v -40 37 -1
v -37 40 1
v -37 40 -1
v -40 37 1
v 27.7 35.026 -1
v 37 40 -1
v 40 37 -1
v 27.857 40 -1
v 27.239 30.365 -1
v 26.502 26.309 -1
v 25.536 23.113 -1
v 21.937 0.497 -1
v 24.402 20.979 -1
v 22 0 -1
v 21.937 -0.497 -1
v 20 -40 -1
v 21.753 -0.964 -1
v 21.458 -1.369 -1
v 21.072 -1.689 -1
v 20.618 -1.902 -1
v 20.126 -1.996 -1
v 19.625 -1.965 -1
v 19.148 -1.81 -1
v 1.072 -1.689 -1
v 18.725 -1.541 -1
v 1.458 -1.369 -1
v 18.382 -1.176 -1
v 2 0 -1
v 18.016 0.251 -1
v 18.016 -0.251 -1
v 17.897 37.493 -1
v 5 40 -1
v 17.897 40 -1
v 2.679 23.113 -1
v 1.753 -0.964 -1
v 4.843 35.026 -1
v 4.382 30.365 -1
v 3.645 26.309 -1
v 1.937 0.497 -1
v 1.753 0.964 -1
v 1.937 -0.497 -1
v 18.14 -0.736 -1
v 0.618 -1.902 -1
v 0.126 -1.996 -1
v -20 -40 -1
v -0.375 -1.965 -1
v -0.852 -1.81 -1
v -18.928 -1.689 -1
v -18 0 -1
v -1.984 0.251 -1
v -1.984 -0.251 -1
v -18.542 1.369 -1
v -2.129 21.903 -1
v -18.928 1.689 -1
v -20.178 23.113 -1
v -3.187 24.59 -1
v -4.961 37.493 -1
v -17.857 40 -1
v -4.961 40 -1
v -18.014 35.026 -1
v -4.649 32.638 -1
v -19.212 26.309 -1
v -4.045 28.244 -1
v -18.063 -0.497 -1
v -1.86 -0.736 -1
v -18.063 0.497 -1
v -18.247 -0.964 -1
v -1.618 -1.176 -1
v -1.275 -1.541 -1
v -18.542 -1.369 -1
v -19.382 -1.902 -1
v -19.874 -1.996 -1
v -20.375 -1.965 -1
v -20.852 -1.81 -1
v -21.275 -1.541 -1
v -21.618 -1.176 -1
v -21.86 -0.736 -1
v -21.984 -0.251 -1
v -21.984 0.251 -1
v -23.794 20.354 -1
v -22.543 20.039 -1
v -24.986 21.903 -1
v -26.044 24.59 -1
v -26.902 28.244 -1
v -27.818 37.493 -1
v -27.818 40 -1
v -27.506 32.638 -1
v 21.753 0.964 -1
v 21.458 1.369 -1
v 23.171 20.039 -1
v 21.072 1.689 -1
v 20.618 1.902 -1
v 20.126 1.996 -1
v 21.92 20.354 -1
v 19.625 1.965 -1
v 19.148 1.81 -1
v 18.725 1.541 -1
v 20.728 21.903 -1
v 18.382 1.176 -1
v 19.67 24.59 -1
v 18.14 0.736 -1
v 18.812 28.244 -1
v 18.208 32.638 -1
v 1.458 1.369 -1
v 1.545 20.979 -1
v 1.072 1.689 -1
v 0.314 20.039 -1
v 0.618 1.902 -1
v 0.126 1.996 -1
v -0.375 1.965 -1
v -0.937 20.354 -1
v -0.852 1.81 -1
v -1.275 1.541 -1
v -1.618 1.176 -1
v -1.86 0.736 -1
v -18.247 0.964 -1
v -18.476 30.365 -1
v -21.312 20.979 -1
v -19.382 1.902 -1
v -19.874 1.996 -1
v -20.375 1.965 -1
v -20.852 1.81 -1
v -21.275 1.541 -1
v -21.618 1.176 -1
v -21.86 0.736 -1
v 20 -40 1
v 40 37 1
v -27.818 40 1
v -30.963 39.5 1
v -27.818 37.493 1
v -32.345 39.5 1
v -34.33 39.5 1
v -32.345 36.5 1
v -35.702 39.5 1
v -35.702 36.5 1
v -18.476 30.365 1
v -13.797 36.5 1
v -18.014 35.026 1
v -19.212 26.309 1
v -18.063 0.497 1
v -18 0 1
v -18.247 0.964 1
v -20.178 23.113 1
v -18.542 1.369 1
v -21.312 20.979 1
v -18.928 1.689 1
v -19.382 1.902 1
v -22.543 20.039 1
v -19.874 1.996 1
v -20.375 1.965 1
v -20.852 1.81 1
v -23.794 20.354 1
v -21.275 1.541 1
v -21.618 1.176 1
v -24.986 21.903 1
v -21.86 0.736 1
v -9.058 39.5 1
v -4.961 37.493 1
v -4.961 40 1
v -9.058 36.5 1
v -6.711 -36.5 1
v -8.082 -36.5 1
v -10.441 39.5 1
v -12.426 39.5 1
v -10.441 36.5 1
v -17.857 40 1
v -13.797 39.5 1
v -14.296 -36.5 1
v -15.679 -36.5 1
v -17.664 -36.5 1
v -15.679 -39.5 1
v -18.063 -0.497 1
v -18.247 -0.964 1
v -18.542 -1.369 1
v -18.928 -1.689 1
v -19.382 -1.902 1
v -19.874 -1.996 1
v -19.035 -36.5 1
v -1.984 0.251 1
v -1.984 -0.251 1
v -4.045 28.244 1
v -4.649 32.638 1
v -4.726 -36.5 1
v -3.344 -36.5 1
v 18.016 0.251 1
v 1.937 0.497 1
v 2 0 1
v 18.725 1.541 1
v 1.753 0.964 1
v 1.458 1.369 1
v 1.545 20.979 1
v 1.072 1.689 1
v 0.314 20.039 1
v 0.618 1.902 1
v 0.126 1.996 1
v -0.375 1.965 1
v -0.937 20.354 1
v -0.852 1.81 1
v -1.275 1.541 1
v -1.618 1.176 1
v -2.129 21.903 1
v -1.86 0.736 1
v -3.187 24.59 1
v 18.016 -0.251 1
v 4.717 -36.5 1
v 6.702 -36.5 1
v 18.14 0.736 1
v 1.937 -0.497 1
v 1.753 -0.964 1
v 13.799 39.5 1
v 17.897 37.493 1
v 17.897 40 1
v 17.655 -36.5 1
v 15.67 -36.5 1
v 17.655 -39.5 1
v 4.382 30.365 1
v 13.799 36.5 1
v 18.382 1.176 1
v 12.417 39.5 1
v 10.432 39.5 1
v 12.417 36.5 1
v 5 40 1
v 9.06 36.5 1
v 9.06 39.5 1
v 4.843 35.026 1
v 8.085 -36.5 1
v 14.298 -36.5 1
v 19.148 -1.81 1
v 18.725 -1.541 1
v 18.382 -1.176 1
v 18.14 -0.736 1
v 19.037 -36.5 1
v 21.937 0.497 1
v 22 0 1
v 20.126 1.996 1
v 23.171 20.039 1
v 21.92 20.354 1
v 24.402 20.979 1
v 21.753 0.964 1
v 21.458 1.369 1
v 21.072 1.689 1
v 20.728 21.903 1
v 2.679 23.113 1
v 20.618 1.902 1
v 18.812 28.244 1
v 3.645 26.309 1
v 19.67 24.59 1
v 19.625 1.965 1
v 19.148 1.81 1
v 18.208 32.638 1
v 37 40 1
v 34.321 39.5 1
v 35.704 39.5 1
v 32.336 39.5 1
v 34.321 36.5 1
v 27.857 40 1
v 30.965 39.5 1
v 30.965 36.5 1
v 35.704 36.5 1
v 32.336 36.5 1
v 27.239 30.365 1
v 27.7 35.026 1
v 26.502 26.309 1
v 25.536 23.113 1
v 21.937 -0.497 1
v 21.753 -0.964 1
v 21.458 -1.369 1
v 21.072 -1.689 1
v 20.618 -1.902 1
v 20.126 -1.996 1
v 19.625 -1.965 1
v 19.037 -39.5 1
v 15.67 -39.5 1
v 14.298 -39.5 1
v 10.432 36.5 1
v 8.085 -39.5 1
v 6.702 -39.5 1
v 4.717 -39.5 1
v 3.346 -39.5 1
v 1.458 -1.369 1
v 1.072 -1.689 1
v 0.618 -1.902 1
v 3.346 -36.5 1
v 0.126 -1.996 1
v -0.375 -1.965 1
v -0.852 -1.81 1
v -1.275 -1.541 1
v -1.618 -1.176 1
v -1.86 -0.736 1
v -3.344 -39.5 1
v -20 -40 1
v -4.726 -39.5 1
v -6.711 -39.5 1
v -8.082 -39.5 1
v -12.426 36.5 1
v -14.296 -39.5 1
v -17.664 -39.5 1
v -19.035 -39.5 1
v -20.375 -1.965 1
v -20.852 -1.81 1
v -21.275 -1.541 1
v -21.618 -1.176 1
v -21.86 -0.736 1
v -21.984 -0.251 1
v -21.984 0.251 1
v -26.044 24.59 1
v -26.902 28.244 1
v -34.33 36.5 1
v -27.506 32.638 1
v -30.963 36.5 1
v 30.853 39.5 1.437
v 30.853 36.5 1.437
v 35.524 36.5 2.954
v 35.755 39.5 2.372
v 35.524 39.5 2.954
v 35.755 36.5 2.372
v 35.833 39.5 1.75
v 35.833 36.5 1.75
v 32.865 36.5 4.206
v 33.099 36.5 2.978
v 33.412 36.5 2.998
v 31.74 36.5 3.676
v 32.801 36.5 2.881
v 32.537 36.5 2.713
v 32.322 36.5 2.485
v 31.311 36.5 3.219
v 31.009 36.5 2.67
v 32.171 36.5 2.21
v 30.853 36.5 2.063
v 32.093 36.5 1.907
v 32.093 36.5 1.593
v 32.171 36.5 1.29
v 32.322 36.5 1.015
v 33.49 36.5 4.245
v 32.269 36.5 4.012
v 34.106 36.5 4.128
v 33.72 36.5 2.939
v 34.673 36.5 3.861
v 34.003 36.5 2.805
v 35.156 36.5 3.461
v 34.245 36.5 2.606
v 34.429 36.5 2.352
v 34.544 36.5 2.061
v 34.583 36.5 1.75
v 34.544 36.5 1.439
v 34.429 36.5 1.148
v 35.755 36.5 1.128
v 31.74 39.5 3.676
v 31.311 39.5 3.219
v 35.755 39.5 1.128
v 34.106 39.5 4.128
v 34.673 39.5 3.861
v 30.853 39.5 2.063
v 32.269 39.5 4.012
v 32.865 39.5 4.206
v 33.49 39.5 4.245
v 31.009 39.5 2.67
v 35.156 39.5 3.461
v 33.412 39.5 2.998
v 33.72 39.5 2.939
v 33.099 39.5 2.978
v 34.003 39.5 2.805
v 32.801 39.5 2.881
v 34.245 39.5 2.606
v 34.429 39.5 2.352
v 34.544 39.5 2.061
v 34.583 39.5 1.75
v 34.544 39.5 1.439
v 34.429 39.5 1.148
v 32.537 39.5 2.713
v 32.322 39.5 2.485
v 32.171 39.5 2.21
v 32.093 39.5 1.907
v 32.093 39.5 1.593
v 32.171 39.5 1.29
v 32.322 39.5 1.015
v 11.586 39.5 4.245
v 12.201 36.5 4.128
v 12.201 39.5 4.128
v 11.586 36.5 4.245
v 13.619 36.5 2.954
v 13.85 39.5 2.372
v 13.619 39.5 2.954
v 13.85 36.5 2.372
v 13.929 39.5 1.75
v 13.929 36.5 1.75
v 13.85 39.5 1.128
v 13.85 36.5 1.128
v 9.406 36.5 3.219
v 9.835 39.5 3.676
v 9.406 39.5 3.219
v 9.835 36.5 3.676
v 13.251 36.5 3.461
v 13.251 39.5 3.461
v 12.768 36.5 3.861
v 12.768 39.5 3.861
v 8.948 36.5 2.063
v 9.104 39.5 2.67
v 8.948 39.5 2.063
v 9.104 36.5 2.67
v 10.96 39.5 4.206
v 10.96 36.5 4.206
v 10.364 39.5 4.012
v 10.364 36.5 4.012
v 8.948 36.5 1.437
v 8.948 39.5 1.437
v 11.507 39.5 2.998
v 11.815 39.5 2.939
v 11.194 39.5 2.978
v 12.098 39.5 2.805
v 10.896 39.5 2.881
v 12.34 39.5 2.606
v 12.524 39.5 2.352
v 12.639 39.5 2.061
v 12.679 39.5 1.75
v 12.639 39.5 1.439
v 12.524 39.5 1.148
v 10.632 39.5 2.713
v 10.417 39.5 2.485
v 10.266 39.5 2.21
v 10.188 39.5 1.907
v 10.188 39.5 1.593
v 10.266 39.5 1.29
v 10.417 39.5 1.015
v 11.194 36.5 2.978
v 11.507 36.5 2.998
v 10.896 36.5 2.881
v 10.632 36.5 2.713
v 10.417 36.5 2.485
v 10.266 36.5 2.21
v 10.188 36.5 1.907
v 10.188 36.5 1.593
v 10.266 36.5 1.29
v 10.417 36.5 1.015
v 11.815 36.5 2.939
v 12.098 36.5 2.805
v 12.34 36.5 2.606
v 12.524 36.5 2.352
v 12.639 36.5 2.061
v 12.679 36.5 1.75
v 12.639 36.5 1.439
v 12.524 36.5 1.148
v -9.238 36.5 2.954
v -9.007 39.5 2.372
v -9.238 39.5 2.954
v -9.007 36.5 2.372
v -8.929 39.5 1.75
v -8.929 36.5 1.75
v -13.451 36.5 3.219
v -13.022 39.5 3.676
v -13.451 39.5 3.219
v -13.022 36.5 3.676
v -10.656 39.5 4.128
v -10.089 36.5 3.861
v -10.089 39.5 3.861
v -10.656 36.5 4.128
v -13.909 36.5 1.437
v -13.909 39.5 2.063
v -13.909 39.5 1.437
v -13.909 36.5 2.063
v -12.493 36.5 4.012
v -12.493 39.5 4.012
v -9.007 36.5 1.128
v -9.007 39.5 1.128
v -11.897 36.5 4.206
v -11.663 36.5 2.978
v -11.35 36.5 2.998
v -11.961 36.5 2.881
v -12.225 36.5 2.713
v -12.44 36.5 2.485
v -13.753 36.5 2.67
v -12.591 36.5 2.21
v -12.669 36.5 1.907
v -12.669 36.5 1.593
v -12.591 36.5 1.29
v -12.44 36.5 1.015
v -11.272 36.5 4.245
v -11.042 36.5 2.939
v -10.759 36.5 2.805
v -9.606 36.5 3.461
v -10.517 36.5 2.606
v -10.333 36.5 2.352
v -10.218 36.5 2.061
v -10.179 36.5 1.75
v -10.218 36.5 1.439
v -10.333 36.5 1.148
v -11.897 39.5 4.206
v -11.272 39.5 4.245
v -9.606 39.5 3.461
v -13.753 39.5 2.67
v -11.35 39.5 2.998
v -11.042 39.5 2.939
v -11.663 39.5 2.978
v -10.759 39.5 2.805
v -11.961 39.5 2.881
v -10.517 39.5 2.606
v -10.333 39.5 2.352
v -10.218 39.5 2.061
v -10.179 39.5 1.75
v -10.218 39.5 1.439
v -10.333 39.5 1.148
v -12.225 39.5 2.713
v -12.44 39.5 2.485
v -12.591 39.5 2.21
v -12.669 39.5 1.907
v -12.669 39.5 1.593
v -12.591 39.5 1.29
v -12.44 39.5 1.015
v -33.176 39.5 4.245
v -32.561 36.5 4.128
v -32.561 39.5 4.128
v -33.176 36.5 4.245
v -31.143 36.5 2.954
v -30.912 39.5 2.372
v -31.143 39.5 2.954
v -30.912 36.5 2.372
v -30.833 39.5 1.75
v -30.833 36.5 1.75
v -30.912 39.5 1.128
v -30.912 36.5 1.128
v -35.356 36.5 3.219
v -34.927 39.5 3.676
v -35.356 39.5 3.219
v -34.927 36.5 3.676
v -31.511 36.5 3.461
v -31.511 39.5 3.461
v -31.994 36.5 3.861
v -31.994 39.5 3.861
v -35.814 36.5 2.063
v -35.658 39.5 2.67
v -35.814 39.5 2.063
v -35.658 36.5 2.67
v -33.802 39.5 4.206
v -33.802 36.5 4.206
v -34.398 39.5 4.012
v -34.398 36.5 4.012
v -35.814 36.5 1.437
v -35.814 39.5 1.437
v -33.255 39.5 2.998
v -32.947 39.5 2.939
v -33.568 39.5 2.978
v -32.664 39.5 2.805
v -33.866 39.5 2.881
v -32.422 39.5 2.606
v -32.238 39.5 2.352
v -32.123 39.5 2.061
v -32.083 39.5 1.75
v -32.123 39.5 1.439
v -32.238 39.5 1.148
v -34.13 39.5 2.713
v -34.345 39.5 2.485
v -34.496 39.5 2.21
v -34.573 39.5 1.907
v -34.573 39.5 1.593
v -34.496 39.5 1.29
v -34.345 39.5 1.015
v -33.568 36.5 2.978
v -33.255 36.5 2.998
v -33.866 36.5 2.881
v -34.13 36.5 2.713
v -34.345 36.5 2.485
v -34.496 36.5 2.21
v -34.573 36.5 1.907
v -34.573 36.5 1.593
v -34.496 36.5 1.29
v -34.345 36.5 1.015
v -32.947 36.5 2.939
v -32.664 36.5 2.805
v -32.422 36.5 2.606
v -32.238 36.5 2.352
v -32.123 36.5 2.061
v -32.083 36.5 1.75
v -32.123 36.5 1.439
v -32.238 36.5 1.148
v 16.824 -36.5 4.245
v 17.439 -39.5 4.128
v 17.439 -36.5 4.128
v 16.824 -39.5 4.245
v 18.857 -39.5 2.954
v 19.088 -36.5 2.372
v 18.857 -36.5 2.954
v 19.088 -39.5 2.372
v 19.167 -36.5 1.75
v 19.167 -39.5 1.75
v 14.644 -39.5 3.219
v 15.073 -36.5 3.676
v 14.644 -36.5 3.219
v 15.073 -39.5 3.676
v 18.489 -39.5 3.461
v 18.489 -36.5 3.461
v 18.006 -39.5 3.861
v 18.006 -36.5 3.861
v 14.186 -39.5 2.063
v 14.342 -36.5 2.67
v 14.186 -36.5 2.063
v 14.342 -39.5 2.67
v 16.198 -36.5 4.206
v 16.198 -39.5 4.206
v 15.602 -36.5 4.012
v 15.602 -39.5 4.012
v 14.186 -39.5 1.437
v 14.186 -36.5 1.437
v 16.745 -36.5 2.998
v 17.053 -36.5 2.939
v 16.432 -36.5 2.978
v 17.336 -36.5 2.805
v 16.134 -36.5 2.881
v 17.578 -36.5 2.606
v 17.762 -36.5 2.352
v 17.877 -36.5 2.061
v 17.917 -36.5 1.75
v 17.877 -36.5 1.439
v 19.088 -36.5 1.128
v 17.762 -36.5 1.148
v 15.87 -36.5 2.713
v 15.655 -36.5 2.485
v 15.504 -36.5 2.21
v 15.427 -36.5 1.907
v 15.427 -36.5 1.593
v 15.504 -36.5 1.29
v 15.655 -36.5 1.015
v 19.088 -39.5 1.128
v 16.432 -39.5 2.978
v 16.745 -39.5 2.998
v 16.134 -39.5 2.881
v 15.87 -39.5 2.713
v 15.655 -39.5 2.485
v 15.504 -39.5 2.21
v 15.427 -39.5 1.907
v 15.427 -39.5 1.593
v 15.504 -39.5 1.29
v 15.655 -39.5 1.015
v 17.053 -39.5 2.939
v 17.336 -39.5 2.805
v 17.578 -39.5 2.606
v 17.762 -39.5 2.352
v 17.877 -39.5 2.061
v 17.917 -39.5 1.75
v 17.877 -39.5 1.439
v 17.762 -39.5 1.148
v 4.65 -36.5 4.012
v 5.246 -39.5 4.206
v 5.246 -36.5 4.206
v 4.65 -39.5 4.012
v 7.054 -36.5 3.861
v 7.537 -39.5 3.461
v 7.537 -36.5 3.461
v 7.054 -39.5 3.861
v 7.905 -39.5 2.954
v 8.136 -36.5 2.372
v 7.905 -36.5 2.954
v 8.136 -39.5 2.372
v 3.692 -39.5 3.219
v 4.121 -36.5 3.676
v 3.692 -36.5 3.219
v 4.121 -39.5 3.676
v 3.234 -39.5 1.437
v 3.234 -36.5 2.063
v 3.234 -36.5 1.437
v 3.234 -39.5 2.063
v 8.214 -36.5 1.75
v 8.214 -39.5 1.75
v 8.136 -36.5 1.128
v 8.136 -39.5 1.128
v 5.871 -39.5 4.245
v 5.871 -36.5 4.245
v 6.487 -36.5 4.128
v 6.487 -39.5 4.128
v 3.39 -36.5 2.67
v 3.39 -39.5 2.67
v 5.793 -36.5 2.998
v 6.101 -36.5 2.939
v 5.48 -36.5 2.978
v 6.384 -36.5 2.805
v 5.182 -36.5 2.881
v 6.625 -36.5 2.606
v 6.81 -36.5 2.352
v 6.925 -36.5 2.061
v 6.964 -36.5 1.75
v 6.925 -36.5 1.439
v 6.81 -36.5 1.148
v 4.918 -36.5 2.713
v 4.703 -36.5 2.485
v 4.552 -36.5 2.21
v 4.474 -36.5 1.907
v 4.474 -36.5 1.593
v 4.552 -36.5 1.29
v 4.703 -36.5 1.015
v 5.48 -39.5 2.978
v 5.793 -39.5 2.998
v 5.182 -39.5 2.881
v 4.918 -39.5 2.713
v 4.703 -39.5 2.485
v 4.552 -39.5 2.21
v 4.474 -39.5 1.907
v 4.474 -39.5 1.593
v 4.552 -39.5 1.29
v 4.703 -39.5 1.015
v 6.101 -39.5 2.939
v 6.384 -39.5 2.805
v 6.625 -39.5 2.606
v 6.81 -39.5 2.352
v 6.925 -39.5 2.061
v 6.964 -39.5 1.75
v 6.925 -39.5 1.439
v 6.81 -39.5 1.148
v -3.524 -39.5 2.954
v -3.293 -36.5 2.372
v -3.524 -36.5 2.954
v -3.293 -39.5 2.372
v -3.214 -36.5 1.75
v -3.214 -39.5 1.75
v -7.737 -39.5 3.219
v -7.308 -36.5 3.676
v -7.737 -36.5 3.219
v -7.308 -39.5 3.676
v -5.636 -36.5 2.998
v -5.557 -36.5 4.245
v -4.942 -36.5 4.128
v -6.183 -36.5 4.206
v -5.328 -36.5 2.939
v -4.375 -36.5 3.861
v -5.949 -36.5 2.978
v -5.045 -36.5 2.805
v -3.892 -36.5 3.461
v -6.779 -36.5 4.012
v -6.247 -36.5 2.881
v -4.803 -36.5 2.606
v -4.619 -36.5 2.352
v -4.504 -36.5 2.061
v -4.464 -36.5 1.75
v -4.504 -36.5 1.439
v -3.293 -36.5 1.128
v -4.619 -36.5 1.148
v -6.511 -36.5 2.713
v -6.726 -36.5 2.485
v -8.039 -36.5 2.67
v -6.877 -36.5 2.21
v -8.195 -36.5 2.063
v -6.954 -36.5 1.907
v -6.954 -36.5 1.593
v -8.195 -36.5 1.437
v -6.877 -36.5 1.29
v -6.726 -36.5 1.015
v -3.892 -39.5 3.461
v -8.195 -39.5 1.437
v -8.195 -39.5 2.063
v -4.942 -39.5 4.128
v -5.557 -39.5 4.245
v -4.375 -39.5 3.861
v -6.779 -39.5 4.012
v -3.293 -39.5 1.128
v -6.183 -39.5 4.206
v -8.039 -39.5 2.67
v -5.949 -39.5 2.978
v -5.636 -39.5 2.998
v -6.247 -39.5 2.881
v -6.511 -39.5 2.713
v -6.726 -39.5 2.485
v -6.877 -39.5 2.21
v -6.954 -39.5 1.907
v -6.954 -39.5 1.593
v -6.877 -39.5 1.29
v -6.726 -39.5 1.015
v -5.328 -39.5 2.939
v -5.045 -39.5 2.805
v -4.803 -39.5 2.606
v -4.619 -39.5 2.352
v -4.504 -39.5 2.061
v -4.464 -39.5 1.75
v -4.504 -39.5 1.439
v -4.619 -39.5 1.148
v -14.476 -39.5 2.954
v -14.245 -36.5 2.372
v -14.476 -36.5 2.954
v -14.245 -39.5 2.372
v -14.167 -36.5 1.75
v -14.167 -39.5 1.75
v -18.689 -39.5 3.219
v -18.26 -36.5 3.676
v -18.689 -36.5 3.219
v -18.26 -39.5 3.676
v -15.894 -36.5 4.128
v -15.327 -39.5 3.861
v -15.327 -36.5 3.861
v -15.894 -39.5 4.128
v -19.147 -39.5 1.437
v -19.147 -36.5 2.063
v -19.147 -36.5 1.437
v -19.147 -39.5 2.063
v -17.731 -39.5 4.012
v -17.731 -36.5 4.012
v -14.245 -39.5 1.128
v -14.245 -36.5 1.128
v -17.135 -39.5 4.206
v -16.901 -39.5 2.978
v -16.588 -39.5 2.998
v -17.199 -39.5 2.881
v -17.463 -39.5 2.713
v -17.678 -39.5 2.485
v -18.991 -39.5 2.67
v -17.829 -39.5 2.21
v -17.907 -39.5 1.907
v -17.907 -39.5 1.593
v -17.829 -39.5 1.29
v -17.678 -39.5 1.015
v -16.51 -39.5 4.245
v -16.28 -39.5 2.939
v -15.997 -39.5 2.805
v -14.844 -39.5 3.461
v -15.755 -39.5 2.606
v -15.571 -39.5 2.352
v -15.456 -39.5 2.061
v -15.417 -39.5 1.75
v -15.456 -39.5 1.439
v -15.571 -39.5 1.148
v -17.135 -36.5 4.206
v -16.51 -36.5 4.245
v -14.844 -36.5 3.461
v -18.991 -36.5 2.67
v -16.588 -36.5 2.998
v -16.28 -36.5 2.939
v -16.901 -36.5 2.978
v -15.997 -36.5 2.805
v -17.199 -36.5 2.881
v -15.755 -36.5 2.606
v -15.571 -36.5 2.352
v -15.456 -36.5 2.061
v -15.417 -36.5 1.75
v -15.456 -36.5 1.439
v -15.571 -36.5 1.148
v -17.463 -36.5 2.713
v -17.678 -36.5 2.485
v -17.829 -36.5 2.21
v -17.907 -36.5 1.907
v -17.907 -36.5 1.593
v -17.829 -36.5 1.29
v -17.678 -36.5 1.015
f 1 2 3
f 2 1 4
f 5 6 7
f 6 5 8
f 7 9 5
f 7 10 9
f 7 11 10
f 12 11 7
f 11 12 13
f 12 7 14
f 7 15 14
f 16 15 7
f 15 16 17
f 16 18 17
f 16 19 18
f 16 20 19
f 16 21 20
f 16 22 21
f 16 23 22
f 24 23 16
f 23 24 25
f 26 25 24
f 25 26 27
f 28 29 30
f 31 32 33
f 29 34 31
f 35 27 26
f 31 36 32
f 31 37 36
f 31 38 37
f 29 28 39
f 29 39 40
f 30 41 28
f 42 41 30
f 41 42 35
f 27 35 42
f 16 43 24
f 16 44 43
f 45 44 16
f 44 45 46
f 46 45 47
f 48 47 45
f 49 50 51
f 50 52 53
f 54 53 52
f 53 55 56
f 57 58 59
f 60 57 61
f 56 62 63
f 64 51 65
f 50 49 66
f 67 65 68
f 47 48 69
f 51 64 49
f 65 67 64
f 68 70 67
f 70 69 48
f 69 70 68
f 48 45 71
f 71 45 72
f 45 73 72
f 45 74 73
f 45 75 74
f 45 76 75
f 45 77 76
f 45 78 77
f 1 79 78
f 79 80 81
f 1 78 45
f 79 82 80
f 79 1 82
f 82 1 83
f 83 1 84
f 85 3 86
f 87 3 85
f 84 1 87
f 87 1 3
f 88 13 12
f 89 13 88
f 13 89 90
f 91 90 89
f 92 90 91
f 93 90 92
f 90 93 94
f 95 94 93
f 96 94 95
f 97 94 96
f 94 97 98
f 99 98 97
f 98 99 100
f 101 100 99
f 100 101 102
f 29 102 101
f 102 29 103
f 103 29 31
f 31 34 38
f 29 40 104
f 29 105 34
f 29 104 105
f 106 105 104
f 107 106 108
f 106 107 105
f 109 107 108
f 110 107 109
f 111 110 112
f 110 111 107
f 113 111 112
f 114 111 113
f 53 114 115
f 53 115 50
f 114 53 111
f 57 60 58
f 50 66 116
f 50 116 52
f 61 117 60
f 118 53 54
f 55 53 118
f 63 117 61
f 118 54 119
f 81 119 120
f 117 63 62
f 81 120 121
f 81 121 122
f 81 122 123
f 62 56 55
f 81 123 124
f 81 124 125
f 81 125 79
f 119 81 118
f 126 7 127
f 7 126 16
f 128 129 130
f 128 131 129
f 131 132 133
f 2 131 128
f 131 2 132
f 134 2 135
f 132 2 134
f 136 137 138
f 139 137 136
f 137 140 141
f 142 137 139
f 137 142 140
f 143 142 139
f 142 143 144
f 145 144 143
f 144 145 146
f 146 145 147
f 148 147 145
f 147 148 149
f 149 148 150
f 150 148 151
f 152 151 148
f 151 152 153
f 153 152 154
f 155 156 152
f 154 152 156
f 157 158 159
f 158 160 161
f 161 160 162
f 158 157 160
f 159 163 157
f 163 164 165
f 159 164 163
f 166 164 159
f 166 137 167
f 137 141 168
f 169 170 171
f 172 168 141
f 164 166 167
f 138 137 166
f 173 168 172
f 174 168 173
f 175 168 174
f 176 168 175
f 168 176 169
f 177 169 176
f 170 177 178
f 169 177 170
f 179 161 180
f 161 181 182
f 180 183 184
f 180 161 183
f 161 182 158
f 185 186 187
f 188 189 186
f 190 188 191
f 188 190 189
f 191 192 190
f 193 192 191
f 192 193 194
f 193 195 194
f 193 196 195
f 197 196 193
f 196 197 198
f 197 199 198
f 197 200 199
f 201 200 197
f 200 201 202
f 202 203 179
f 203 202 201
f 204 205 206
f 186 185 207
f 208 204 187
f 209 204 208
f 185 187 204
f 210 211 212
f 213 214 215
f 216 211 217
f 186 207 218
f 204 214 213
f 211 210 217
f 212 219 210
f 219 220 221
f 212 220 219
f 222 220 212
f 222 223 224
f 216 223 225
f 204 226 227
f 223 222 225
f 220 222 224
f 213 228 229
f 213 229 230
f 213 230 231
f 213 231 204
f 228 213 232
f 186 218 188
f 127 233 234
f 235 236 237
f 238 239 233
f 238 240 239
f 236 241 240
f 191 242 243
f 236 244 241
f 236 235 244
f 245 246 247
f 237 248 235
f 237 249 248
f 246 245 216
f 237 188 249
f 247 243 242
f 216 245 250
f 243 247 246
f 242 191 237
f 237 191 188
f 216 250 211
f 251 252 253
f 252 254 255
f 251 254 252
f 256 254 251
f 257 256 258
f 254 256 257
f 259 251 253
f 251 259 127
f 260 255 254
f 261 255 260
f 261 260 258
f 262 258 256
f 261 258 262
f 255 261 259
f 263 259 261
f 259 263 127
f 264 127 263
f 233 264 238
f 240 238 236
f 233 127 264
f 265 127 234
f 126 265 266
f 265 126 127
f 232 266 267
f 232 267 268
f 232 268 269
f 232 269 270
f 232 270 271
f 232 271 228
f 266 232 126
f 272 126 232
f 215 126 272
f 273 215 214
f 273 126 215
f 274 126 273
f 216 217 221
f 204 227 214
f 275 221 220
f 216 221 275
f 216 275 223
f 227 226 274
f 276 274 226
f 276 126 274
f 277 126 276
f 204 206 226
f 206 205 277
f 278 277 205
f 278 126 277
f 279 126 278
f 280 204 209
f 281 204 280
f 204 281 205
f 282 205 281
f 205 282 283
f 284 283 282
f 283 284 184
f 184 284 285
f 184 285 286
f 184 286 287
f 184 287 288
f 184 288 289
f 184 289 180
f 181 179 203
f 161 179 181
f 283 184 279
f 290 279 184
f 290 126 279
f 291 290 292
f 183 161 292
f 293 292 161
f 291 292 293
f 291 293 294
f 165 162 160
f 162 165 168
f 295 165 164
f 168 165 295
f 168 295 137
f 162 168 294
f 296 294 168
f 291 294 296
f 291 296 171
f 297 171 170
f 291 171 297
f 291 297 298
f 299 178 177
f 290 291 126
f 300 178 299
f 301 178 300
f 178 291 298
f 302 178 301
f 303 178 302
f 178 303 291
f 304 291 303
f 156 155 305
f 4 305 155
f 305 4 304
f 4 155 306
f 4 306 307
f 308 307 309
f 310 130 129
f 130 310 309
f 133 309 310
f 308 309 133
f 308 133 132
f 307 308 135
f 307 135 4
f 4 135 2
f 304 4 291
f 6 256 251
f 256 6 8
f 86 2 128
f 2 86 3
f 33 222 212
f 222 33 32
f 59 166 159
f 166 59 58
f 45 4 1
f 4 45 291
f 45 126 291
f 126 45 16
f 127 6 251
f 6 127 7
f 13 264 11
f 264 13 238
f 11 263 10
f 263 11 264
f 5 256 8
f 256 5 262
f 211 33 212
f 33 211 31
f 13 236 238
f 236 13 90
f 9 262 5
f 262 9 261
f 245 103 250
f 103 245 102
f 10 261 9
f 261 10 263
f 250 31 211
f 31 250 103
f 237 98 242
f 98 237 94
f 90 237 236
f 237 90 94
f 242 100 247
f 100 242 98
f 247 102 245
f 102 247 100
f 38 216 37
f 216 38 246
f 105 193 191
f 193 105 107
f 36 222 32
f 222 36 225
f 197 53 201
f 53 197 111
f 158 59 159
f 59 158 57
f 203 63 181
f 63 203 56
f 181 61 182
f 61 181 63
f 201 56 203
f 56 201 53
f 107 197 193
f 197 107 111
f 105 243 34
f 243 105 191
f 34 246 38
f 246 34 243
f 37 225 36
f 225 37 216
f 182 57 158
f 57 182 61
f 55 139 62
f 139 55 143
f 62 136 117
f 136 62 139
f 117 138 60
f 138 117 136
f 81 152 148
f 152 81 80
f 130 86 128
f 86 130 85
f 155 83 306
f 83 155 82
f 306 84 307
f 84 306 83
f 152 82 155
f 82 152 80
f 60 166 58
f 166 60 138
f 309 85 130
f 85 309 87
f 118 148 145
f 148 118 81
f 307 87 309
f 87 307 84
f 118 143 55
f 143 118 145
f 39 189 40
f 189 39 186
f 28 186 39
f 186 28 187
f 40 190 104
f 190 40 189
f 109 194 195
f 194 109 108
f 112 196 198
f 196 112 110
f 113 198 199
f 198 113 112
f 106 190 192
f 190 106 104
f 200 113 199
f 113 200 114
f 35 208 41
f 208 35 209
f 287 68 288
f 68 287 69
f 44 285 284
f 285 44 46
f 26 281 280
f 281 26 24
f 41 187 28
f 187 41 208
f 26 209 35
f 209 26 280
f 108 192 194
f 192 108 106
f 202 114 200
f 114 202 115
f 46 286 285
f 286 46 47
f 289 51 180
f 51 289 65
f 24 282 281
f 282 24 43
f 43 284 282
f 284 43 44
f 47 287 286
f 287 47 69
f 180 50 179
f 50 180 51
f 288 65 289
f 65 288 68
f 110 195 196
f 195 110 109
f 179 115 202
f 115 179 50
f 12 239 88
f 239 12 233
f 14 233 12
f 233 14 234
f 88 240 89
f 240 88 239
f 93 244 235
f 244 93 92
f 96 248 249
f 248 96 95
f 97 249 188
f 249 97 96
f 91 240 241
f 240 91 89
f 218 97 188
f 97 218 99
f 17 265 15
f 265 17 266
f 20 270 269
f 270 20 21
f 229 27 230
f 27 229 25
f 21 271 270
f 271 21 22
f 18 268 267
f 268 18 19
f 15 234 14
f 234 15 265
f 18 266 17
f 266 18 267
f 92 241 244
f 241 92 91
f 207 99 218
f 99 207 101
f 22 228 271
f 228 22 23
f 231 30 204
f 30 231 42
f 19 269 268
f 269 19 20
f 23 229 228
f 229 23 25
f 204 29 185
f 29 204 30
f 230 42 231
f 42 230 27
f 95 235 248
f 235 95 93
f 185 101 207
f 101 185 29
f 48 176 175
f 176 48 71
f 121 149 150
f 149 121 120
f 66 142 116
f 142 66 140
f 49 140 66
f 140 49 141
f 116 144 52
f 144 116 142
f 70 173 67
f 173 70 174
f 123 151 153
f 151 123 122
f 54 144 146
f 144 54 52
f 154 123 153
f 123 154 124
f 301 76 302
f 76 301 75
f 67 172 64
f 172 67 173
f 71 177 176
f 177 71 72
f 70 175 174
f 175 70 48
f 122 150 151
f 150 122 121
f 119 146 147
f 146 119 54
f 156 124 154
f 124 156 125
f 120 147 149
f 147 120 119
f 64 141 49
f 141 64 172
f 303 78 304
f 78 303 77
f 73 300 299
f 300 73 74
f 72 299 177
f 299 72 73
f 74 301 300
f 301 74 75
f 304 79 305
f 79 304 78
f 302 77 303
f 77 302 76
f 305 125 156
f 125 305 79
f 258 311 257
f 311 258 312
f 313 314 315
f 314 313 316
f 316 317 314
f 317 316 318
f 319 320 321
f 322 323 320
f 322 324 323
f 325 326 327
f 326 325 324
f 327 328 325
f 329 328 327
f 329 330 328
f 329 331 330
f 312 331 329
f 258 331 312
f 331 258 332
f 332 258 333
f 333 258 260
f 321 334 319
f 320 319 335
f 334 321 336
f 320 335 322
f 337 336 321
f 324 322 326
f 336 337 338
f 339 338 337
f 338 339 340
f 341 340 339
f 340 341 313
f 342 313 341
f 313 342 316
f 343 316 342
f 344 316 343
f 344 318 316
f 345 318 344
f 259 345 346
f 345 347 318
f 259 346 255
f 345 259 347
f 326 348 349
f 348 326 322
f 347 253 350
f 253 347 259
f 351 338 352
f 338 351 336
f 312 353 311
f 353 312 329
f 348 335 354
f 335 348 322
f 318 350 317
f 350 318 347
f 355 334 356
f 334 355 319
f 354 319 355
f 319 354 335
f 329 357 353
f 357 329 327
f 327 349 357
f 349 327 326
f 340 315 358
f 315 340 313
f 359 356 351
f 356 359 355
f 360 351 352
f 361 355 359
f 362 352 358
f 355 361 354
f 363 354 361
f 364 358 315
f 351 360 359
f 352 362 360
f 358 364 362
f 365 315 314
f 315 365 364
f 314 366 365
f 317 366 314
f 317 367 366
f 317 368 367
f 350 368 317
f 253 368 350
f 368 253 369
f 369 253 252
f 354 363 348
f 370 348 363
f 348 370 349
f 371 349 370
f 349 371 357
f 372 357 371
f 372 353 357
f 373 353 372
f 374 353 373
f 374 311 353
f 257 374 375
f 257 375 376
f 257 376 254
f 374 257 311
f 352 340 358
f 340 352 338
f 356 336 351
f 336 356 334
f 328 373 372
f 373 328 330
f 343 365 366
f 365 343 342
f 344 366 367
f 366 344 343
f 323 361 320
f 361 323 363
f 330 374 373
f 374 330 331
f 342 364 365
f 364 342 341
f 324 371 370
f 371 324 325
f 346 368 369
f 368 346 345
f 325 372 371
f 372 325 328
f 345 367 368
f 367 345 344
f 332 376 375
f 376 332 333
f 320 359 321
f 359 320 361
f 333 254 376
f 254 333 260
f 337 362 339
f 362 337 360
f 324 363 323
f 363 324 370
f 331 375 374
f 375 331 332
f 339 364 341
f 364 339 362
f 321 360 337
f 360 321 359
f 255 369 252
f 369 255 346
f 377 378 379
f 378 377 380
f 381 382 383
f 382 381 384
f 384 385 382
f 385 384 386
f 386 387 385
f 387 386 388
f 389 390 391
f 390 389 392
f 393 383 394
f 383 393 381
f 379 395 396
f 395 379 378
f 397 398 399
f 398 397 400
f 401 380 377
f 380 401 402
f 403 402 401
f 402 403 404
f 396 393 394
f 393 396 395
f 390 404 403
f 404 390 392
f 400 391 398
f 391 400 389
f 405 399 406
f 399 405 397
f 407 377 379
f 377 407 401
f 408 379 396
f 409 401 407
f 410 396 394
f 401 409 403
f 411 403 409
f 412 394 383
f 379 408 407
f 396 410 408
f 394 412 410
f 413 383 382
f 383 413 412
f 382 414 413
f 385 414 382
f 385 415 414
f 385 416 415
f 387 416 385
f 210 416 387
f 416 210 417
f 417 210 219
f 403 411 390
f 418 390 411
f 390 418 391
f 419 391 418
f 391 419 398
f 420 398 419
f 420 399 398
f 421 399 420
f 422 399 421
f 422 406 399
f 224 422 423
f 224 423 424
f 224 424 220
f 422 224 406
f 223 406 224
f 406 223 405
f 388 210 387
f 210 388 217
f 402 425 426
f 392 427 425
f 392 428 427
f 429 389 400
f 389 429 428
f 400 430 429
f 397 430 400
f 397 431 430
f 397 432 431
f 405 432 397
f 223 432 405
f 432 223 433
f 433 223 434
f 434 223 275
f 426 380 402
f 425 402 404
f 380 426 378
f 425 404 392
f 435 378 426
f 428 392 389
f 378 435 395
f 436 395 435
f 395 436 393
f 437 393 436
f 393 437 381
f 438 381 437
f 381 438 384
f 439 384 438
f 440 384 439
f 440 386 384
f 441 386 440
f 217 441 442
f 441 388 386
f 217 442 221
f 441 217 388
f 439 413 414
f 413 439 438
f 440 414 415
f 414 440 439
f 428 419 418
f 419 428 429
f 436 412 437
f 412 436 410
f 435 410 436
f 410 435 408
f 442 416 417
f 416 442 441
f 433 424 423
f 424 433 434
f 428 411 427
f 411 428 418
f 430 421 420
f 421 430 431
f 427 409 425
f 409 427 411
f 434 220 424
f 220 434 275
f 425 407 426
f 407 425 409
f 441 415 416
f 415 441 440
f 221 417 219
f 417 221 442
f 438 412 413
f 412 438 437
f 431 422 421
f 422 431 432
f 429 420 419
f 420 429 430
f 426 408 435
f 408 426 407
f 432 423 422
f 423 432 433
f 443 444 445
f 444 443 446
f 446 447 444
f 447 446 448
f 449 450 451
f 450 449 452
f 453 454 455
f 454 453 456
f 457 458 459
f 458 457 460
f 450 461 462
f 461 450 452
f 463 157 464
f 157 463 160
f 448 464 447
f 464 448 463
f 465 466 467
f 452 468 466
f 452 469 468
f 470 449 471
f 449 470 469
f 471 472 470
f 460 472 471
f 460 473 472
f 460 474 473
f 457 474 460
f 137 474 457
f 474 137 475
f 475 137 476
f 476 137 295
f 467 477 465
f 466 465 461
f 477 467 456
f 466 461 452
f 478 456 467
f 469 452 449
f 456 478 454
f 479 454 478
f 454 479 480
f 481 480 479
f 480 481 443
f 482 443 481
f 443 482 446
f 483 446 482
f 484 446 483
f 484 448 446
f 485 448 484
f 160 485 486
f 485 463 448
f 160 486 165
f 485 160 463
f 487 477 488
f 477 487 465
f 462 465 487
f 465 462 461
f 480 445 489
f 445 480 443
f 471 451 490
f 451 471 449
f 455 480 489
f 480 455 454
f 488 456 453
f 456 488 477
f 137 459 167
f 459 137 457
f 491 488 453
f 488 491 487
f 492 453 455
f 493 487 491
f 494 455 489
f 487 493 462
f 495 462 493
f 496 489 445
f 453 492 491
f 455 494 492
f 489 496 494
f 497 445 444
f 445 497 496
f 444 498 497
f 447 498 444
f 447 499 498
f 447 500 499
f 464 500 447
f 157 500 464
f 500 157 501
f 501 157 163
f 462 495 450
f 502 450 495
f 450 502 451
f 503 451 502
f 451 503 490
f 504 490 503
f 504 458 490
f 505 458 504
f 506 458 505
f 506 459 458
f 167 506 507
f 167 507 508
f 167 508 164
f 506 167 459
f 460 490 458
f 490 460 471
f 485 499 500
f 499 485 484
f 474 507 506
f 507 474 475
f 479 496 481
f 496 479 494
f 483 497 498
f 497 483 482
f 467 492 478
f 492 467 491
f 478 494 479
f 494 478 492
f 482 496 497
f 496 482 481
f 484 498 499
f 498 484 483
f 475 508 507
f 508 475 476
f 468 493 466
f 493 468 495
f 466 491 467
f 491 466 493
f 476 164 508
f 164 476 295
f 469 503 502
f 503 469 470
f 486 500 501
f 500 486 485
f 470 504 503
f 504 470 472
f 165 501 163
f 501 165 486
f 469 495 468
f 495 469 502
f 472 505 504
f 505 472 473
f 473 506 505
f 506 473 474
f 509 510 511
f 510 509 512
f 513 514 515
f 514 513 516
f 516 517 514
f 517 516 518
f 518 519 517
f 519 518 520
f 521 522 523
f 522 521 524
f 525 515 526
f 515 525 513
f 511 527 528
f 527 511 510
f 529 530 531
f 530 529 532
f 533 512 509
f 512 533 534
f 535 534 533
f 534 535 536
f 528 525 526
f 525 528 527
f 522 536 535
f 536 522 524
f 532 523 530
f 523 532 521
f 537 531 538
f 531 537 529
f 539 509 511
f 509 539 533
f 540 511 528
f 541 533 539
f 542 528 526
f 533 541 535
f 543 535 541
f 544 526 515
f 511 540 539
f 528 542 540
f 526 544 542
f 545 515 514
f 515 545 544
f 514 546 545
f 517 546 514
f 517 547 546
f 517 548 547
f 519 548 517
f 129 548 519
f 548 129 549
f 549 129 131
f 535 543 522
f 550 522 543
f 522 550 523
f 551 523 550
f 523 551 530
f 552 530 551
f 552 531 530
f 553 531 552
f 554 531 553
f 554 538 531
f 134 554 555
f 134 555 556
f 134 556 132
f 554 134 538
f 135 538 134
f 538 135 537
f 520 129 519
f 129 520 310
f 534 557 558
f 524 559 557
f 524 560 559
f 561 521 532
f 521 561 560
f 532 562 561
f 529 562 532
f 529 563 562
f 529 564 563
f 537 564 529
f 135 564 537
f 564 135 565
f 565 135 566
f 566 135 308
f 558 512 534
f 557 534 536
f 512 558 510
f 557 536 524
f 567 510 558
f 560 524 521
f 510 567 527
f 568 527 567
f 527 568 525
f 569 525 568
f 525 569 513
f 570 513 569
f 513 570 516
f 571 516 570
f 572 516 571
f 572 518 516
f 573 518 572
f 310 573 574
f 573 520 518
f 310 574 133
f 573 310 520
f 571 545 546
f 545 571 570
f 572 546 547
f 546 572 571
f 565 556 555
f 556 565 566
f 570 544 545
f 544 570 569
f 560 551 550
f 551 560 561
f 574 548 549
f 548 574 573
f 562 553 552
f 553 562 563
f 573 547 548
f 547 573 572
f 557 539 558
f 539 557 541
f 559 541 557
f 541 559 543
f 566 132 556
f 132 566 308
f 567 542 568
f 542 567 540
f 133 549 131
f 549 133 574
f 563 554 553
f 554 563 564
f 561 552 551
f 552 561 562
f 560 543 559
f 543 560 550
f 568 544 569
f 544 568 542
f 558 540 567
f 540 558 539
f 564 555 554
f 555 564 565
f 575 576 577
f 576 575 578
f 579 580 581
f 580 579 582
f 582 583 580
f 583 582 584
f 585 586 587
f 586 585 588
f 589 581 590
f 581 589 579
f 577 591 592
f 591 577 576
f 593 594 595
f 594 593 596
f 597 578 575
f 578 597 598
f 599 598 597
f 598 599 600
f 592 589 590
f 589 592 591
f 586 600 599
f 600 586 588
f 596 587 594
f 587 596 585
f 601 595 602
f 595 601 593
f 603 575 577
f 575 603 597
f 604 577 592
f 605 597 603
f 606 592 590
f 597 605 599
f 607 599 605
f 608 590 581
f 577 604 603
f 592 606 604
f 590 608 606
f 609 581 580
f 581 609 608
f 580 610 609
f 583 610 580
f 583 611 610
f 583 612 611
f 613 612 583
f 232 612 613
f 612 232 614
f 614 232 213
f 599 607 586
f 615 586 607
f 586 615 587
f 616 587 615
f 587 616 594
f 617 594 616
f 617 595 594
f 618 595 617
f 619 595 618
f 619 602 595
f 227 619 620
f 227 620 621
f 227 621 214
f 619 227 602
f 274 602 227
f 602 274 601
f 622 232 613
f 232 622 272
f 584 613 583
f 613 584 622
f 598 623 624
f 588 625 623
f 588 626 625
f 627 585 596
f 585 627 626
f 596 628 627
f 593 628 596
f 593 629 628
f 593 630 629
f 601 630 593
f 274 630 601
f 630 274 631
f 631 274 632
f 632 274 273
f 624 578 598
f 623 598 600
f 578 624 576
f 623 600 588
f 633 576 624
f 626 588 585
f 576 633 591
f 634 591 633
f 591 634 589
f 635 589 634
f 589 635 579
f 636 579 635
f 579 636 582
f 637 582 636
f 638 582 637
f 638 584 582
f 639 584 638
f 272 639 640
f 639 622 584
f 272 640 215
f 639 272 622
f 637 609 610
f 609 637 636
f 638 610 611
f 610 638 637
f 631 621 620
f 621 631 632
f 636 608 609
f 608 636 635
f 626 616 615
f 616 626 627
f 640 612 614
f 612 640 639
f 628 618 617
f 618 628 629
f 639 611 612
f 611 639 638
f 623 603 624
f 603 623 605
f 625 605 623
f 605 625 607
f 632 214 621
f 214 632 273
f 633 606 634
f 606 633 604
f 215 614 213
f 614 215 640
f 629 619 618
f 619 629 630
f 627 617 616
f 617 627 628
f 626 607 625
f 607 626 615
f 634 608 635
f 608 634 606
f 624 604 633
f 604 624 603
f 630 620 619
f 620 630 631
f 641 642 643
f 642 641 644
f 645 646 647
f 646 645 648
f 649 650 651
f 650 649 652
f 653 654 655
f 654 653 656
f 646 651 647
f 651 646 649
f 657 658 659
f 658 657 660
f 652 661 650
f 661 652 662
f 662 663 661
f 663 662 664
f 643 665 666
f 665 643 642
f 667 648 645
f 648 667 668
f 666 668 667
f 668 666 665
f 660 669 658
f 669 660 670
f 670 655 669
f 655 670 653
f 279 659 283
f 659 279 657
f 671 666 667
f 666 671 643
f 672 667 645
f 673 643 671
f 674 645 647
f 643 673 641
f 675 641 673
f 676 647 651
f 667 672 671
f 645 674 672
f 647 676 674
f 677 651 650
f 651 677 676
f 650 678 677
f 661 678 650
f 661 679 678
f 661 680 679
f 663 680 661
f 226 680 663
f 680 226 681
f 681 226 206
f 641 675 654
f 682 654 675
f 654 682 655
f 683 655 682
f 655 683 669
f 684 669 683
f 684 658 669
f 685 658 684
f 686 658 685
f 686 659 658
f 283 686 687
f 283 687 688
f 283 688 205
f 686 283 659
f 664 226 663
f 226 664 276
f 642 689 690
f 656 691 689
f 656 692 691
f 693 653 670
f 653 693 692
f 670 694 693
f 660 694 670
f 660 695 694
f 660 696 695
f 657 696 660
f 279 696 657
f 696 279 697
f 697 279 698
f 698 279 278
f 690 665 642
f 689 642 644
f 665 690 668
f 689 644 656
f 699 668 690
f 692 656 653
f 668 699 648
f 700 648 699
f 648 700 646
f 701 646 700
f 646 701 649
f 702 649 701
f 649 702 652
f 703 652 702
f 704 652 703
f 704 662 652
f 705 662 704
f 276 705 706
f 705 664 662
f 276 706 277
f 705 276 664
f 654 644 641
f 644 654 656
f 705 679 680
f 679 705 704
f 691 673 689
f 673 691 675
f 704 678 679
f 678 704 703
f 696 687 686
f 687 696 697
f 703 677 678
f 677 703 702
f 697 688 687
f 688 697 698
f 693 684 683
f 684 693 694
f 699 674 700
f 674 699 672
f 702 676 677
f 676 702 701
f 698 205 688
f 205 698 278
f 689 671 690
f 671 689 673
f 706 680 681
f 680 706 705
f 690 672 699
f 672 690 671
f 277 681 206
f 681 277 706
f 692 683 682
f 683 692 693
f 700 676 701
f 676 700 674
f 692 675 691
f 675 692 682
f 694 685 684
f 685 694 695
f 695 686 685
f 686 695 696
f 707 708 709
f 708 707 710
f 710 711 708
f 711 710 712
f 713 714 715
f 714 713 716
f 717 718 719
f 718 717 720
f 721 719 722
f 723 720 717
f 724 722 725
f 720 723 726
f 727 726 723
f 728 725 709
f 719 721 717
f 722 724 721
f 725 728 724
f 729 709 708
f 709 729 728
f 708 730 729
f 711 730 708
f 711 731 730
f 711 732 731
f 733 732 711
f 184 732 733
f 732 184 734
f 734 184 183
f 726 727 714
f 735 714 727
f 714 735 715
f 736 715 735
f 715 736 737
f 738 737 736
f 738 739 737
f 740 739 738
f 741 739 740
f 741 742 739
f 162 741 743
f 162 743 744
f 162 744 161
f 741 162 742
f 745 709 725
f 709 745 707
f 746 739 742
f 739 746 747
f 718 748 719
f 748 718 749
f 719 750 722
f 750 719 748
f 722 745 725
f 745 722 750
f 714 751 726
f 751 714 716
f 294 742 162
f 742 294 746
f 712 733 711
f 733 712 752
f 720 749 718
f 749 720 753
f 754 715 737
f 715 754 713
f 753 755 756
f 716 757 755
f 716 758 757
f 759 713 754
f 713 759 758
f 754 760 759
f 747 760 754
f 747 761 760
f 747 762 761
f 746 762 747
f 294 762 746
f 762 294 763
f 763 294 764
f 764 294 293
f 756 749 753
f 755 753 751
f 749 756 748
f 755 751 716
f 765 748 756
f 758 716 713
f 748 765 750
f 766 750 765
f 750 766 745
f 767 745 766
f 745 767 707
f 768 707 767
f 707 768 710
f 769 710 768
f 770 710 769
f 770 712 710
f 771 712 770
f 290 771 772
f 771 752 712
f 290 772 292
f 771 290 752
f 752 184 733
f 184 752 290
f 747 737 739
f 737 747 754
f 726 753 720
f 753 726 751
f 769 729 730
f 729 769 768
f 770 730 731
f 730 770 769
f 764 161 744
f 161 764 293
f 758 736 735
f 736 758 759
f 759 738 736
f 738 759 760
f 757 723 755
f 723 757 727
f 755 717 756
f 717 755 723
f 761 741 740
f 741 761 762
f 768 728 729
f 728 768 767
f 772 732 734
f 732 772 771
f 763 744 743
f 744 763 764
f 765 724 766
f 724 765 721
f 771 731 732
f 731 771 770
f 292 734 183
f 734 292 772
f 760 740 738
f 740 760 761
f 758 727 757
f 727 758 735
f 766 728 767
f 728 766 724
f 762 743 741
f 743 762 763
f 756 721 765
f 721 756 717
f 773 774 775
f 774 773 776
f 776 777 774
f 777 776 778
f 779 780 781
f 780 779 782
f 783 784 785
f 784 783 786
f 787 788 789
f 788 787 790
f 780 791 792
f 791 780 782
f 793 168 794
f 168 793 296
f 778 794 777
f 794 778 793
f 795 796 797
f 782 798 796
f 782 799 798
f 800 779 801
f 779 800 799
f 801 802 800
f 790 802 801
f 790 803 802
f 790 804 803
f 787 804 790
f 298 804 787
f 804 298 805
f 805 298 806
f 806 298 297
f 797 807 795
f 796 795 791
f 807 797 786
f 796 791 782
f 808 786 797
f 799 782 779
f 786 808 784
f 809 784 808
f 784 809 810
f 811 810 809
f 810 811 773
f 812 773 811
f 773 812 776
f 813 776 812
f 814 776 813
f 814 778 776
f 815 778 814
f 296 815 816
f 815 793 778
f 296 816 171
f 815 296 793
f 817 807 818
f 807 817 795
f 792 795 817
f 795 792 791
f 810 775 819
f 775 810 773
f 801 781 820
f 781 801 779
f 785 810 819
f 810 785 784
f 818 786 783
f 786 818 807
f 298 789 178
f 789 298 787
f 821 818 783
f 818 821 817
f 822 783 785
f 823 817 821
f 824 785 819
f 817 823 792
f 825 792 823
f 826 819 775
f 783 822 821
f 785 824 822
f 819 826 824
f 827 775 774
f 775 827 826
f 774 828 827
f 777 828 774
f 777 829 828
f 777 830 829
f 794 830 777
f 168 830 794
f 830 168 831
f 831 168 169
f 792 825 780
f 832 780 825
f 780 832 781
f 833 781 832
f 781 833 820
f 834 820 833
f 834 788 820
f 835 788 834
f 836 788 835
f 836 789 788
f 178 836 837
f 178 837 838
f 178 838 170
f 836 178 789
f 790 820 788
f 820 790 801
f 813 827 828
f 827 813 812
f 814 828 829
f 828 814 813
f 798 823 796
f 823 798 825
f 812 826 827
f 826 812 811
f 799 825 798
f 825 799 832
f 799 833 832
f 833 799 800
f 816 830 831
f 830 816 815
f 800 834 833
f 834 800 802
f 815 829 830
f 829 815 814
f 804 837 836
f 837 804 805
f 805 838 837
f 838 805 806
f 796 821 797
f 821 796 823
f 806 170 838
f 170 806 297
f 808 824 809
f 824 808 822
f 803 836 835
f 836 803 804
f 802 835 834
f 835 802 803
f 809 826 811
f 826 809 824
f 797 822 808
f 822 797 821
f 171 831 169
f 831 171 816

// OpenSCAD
//(knuckle width) - Measurement E
kw=80;

/*[hidden]*/
$fn=25;


union(){

difference(){
linear_extrude(height=2,center=true)polygon([ [kw/2,kw/2-3],[kw/2-3,kw/2],[-kw/2+3,kw/2],[-kw/2,kw/2-3],[-kw/4,-kw/2],[kw/4,-kw/2] ]);

//webbing spaces
translate([kw/3.5,40,0])scale([1,4,1])cylinder(r=kw/16,h=4,center=true);
translate([0,40,0])scale([1,4,1])cylinder(r=kw/16,h=4,center=true);
translate([-kw/3.5,40,0])scale([1,4,1])cylinder(r=kw/16,h=4,center=true);

//strap mount holes
cylinder(r=2,h=4,center=true);
translate([kw/4,0,0])cylinder(r=2,h=4,center=true);
translate([-kw/4,0,0])cylinder(r=2,h=4,center=true);

}

//knuckle guides
difference(){
translate([kw/2.4,kw/2-2,1.75])rotate([90,0,0])cylinder(r=2.5,h=3,center=true);
translate([kw/2.4,kw/2-2,1.75])rotate([90,0,0])cylinder(r=1.25,h=5,center=true);
}

difference(){
translate([kw/7,kw/2-2,1.75])rotate([90,0,0])cylinder(r=2.5,h=3,center=true);
translate([kw/7,kw/2-2,1.75])rotate([90,0,0])cylinder(r=1.25,h=5,center=true);
}

difference(){
translate([-kw/7,kw/2-2,1.75])rotate([90,0,0])cylinder(r=2.5,h=3,center=true);
translate([-kw/7,kw/2-2,1.75])rotate([90,0,0])cylinder(r=1.25,h=5,center=true);
}

difference(){
translate([-kw/2.4,kw/2-2,1.75])rotate([90,0,0])cylinder(r=2.5,h=3,center=true);
translate([-kw/2.4,kw/2-2,1.75])rotate([90,0,0])cylinder(r=1.25,h=5,center=true);
}


//wrist guides
difference(){
translate([(kw/2.4)/2,-kw/2+2,1.75])rotate([90,0,0])cylinder(r=2.5,h=3,center=true);
translate([(kw/2.4)/2,-kw/2+2,1.75])rotate([90,0,0])cylinder(r=1.25,h=5,center=true);
}

difference(){
translate([(kw/7)/2,-kw/2+2,1.75])rotate([90,0,0])cylinder(r=2.5,h=3,center=true);
translate([(kw/7)/2,-kw/2+2,1.75])rotate([90,0,0])cylinder(r=1.25,h=5,center=true);
}

difference(){
translate([(-kw/7)/2,-kw/2+2,1.75])rotate([90,0,0])cylinder(r=2.5,h=3,center=true);
translate([(-kw/7)/2,-kw/2+2,1.75])rotate([90,0,0])cylinder(r=1.25,h=5,center=true);
}

difference(){
translate([(-kw/2.4)/2,-kw/2+2,1.75])rotate([90,0,0])cylinder(r=2.5,h=3,center=true);
translate([(-kw/2.4)/2,-kw/2+2,1.75])rotate([90,0,0])cylinder(r=1.25,h=5,center=true);
}

}
